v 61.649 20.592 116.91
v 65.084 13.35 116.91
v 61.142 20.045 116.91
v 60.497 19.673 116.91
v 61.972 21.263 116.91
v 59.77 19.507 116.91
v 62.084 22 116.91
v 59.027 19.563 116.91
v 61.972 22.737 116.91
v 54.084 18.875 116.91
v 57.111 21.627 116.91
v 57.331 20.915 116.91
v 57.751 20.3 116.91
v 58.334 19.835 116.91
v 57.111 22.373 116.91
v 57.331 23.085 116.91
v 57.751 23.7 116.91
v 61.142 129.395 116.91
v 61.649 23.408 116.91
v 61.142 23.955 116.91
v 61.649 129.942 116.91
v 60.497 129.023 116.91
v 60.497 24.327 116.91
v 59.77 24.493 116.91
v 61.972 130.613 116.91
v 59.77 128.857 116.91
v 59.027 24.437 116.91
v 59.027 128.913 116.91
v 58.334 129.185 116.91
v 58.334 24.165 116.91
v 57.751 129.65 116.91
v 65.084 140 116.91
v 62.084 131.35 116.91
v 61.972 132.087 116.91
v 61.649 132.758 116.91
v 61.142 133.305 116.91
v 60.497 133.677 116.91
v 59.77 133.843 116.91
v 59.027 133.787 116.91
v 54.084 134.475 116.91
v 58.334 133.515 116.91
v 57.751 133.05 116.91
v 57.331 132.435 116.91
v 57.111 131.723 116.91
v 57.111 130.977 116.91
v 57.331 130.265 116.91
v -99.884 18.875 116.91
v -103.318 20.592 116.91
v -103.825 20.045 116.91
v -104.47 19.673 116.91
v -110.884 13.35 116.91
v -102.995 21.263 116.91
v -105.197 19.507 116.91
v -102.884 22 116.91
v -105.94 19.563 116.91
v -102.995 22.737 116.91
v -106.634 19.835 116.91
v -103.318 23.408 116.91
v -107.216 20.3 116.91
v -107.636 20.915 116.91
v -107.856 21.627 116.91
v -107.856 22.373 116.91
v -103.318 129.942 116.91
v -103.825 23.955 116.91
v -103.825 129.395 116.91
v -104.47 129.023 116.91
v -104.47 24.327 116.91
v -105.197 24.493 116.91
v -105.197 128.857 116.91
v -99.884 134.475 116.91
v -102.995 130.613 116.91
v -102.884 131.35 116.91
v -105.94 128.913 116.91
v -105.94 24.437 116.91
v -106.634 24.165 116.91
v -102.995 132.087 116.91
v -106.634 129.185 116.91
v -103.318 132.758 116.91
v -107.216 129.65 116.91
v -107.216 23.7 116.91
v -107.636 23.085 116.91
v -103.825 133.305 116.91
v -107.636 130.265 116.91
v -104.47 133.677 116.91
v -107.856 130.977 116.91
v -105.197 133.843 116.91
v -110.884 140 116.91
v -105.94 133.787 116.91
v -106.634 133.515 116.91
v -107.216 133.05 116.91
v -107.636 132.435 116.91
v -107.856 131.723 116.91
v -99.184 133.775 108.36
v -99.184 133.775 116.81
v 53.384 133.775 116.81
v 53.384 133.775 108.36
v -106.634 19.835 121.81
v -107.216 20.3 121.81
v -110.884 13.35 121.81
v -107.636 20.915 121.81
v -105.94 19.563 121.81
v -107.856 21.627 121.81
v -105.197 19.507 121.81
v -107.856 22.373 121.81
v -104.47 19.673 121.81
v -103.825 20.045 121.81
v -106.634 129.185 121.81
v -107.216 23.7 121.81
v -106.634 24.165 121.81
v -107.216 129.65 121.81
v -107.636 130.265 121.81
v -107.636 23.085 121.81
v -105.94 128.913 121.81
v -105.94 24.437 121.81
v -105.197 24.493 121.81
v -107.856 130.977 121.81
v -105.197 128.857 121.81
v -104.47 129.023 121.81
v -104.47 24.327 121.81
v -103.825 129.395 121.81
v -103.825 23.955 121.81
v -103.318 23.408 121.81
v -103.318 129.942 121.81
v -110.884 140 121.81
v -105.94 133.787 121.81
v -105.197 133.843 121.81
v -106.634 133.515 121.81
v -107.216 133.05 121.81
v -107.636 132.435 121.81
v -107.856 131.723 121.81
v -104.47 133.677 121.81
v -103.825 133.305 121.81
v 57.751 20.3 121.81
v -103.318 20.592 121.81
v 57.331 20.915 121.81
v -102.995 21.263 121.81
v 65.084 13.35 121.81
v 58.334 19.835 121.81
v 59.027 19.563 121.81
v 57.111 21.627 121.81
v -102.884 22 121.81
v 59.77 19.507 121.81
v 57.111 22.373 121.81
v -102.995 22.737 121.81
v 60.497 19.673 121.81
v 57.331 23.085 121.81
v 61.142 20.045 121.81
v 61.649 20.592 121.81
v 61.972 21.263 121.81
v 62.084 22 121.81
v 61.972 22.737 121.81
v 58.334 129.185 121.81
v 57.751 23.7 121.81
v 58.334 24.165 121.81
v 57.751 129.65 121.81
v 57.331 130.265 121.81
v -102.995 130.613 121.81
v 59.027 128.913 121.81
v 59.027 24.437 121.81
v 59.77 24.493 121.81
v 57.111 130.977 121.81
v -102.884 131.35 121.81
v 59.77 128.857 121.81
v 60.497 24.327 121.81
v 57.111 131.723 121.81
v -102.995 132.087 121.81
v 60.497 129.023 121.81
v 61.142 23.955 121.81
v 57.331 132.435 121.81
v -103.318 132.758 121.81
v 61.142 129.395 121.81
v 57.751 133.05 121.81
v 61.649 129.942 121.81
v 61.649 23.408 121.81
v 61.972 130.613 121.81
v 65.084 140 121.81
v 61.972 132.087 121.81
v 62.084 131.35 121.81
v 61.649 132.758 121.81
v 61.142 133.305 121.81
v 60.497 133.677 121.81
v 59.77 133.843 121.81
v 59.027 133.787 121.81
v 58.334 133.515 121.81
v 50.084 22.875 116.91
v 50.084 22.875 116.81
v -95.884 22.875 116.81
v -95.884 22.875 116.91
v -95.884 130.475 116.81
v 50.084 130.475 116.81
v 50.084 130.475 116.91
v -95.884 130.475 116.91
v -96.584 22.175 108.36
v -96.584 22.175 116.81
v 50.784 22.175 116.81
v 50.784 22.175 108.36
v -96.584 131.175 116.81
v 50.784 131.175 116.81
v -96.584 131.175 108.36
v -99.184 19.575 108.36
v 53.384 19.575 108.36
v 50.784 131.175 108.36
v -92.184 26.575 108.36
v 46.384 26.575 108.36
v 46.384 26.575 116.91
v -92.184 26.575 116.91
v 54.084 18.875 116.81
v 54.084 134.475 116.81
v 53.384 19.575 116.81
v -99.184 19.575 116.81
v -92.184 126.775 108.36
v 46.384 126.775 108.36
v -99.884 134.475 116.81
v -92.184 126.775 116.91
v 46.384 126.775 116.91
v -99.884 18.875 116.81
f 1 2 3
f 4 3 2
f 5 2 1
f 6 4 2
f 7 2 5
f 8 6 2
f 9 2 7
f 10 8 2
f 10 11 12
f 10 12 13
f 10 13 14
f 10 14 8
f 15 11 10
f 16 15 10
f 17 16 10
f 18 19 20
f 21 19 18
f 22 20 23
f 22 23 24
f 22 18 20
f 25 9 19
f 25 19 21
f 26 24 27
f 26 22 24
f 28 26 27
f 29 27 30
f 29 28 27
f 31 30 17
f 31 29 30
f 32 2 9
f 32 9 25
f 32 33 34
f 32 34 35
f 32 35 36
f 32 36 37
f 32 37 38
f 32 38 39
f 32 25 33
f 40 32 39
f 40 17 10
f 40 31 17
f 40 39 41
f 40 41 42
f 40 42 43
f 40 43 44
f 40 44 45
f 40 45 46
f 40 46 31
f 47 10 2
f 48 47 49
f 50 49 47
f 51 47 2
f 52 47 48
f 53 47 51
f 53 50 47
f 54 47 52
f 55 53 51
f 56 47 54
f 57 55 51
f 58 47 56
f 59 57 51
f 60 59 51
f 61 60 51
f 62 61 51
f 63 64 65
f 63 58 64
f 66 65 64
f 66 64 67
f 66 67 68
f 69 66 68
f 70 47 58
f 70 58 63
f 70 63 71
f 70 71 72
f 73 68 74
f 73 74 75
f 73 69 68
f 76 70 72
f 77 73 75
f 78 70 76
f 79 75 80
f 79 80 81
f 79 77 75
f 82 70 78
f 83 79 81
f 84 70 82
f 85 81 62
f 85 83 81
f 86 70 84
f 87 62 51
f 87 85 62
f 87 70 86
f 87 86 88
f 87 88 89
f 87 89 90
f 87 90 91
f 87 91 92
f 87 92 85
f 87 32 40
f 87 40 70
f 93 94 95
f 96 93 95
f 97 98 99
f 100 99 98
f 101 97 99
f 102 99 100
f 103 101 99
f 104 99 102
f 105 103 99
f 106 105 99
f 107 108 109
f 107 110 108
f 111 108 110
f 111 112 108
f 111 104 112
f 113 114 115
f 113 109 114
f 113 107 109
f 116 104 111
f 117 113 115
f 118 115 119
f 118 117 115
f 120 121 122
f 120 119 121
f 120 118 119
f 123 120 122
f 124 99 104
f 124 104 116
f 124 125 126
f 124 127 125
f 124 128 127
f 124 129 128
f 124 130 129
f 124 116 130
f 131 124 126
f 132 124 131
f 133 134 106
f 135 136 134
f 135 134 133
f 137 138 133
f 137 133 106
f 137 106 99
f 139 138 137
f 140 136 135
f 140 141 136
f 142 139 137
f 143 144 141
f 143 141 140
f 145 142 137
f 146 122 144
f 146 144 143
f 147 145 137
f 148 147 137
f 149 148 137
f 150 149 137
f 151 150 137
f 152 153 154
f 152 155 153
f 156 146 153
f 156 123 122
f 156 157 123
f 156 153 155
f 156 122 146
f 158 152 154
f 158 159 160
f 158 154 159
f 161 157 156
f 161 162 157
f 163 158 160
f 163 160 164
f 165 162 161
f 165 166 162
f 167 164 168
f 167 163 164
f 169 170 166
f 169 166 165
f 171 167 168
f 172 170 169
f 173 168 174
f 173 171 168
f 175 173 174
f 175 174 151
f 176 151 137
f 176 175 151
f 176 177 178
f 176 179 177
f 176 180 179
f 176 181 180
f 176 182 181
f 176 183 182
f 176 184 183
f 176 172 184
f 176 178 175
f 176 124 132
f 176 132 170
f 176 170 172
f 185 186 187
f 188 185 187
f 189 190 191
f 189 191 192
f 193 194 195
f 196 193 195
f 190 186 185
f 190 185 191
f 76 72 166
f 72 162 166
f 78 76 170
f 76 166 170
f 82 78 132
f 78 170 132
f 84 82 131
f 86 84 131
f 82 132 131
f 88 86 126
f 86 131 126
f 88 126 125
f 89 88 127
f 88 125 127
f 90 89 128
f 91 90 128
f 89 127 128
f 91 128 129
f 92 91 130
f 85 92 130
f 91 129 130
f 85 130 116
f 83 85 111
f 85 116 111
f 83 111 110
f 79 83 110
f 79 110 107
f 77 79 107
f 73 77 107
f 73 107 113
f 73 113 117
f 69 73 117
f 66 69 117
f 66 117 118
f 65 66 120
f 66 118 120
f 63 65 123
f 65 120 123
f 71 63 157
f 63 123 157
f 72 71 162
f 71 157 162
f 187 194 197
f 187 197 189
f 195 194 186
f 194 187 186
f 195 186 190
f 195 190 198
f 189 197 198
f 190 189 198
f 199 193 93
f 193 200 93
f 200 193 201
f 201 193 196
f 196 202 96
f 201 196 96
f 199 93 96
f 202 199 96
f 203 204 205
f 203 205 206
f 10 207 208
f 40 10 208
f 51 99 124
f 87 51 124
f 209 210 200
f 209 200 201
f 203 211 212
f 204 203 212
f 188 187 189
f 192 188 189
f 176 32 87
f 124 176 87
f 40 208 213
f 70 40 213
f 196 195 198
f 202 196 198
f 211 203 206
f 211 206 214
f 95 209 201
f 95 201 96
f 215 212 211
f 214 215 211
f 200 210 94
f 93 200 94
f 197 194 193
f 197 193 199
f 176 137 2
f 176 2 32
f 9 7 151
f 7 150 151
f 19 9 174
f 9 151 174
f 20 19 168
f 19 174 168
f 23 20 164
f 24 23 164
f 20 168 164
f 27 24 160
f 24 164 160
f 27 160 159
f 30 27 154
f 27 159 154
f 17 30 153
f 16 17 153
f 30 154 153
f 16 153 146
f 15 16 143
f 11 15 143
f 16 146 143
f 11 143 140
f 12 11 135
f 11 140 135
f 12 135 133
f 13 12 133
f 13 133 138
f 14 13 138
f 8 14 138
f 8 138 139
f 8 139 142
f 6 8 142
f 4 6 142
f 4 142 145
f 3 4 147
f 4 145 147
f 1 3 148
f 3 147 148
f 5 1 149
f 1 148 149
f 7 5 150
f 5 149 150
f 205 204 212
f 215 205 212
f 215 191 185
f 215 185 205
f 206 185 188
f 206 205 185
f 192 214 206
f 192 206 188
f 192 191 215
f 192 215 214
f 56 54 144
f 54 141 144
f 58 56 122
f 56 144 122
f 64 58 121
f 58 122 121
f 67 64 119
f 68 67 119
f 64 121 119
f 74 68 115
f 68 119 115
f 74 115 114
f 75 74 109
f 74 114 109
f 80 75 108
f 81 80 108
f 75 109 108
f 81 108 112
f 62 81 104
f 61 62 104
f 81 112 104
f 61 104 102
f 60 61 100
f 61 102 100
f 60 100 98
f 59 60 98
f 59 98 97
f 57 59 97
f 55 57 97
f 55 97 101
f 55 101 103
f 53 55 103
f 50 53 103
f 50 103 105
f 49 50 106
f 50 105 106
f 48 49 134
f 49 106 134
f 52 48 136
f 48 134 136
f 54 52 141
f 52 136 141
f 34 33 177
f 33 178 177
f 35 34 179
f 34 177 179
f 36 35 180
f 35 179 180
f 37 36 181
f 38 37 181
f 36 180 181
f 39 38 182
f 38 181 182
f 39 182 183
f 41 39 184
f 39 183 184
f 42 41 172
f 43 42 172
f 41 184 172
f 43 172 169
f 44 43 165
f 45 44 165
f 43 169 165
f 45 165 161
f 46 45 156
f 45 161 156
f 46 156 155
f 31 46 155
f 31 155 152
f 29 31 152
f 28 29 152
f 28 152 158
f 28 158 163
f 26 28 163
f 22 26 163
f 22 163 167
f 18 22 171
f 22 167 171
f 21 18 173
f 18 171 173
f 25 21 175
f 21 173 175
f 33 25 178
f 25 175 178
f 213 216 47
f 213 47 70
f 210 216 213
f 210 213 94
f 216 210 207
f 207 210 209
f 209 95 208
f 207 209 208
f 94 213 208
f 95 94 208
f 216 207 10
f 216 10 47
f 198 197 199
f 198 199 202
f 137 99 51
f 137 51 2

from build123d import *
from OCP.BRepFilletAPI import BRepFilletAPI_MakeChamfer

# Parameters (mm, degrees)
SKETCH1_R               = 172.5
BOSS_EXTRUDE1_DEPTH     = 10
SKETCH2_R               = 48.41
CUT_EXTRUDE1_DEPTH      = 10
BOSS_EXTRUDE2_DEPTH     = 5
CUT_EXTRUDE2_DEPTH      = 497
CUT_EXTRUDE6_START      = -497
CUT_EXTRUDE6_DEPTH      = 497
SKETCH6_W               = 195.767044214
SKETCH6_H               = 55
SKETCH6_W_2             = 185.767044214
SKETCH6_H_2             = 45
BOSS_EXTRUDE3_DEPTH     = 133.35
SKETCH7_W               = 185.767044214
SKETCH7_H               = 45
BOSS_EXTRUDE4_DEPTH     = 5
BOSS_EXTRUDE5_DEPTH     = 8
CHAMFER1_SIZE           = 8
CHAMFER1_SIZE2          = 6.250285012
CHAMFER1_PART_2_SIZE    = 8
CHAMFER1_PART_2_SIZE2   = 6.250285012
CHAMFER1_PART_3_SIZE    = 8
CHAMFER1_PART_3_SIZE2   = 6.250285012
FILLET1_R               = 38
SKETCH9_R               = 374.079334695
CUT_EXTRUDE7_DEPTH      = 93
CUT_EXTRUDE8_DEPTH      = 93
CUT_EXTRUDE8_DEPTH_BACK = 93
SKETCH10_R              = 229.38613092
SKETCH10_R_2            = 152.4
SKETCH11_W              = 291.443368419
SKETCH11_H              = 134.798764099
SKETCH11_W_2            = 144.967044214
SKETCH11_H_2            = 55
CUT_EXTRUDE9_DEPTH      = 143
SKETCH12_W              = 5
SKETCH12_H              = 55
BOSS_EXTRUDE6_DEPTH     = 133.35
SKETCH13_R              = 10
CUT_EXTRUDE10_DEPTH     = 58
SKETCH14_W              = 139.967044214
SKETCH14_H              = 45
BOSS_EXTRUDE7_DEPTH     = 5
SKETCH15_W              = 139.967044214
SKETCH15_H              = 123.35
CUT_EXTRUDE11_DEPTH     = 13
SKETCH16_W              = 10
SKETCH16_H              = 133.35
SKETCH16_W_2            = 149.967044214
BOSS_EXTRUDE9_DEPTH     = 17
SKETCH17_W              = 153.967044214
SKETCH17_H              = 115.6
SKETCH17_W_2            = 145.967044214
SKETCH17_H_2            = 107.6
CUT_EXTRUDE12_DEPTH     = 10
CHAMFER2_SIZE           = 10
CHAMFER2_SIZE2          = 5.773502692
SKETCH24_R              = 15
CUT_EXTRUDE16_DEPTH     = 177.5
SKETCH20_W              = 169.967044214
SKETCH20_H              = 3.35
CUT_EXTRUDE17_DEPTH     = 177.5
SKETCH25_W              = 139.967044214
SKETCH25_H              = 38.773502692
BOSS_EXTRUDE11_DEPTH    = 5
SKETCH26_W              = 3
SKETCH26_H              = 130
BOSS_EXTRUDE12_DEPTH    = 17
SKETCH18_R              = 2.5
CUT_EXTRUDE19_DEPTH     = 26
SKETCH27_W              = 152.567044214
SKETCH27_H              = 114.2
SKETCH27_W_2            = 147.367044214
SKETCH27_H_2            = 109
BOSS_EXTRUDE13_DEPTH    = 8.45
SKETCH27_W_3            = 138.567044214
SKETCH27_H_3            = 100.2
BOSS_EXTRUDE13_2_DEPTH  = 8.45
BOSS_EXTRUDE14_START    = 5
SKETCH28_W              = 175.967044214
SKETCH28_H              = 130
SKETCH28_R              = 2.5
BOSS_EXTRUDE14_DEPTH    = 5
SKETCH29_W              = 292.528596907
SKETCH29_H              = 171.315367969
CUT_EXTRUDE20_DEPTH     = 46.55
SKETCH30_W              = 175.967044214
SKETCH30_H              = 130
SKETCH30_W_2            = 153.967044214
SKETCH30_H_2            = 115.6
SKETCH30_W_3            = 145.967044214
SKETCH30_H_3            = 107.6
SKETCH30_W_4            = 138.567044214
SKETCH30_H_4            = 100.2
CUT_EXTRUDE23_DEPTH     = 8.55
SKETCH31_W              = 175.967044214
SKETCH31_H              = 17.196232217
CUT_EXTRUDE24_DEPTH     = 10


with BuildPart() as part:
    # Sketch1 → Boss-Extrude1 (new body)
    with BuildSketch(Plane(origin=(0, 0, 0), x_dir=(1, 0, 0), z_dir=(0, 1, 0))):
        with Locations(Location((0, 0, 0), (0, 0, 270))):
            Circle(SKETCH1_R)
    extrude(amount=BOSS_EXTRUDE1_DEPTH)

    # Sketch2 → Cut-Extrude1 (cut)
    with BuildSketch(Plane(origin=(0, 10, 0), x_dir=(1, 0, 0), z_dir=(0, 1, 0))):
        with Locations((-75.91, -178.72)):
            Circle(SKETCH2_R)
        with Locations((75.91, -178.72)):
            Circle(SKETCH2_R)
    extrude(amount=-CUT_EXTRUDE1_DEPTH, mode=Mode.SUBTRACT)

    # Sketch3 → Boss-Extrude2 (add)
    with BuildSketch(Plane(origin=(0, 10, 0), x_dir=(1, 0, 0), z_dir=(0, 1, 0))):
        with BuildLine():
            Line((-98.968297449, -119.81), (98.968297449, -119.81))
            ThreePointArc((98.968297449, -119.81), (0, 155.4), (-98.968297449, -119.81))
        make_face()
        with BuildLine():
            ThreePointArc((97.883522107, -116.81), (0, 152.4), (-97.883522107, -116.81))
            Line((-97.883522107, -116.81), (97.883522107, -116.81))
        make_face(mode=Mode.SUBTRACT)
    extrude(amount=BOSS_EXTRUDE2_DEPTH)

    # Sketch4 → Cut-Extrude2 (cut)
    with BuildSketch(Plane(origin=(0, 10, 0), x_dir=(1, 0, 0), z_dir=(0, 1, 0))):
        Polygon((-28.261160255, -170.169200565), (28.261160255, -170.169200565), (28.261160255, -183.836149753), (-30.300470404, -183.836149753), align=None)
    extrude(amount=-CUT_EXTRUDE2_DEPTH, mode=Mode.SUBTRACT)

    # Sketch5 → Cut-Extrude6 (cut)
    with BuildSketch(Plane(origin=(0, 10, 0), x_dir=(1, 0, 0), z_dir=(0, 1, 0)).offset(CUT_EXTRUDE6_START)):
        with BuildLine():
            ThreePointArc((26.702080818, 170.420799435), (0, 172.5), (-26.702080818, 170.420799435))
            Line((-26.702080818, 170.420799435), (26.702080818, 170.420799435))
        make_face()
        with BuildLine():
            ThreePointArc((166.525, -45.007492432), (172.5, 0), (166.525, 45.007492432))
            Line((166.525, 45.007492432), (166.525, -45.007492432))
        make_face()
        with BuildLine():
            Line((-166.525, -45.007492432), (-166.525, 45.007492432))
            ThreePointArc((-166.525, 45.007492432), (-172.5, 0), (-166.525, -45.007492432))
        make_face()
    extrude(amount=CUT_EXTRUDE6_DEPTH, mode=Mode.SUBTRACT)

    # Sketch6 → Boss-Extrude3 (add)
    with BuildSketch(Plane(origin=(0, 10, 0), x_dir=(1, 0, 0), z_dir=(0, 1, 0))):
        with Locations((0, -89.31)):
            Rectangle(SKETCH6_W, SKETCH6_H)
        with Locations((0, -89.31)):
            Rectangle(SKETCH6_W_2, SKETCH6_H_2, mode=Mode.SUBTRACT)
    extrude(amount=BOSS_EXTRUDE3_DEPTH)

    # Sketch7 → Boss-Extrude4 (add)
    with BuildSketch(Plane(origin=(0, 10, 0), x_dir=(1, 0, 0), z_dir=(0, 1, 0))):
        with Locations((0, -89.31)):
            Rectangle(SKETCH7_W, SKETCH7_H)
    extrude(amount=BOSS_EXTRUDE4_DEPTH)

    # Sketch8 → Boss-Extrude5 (add)
    with BuildSketch(Plane(origin=(0, 10, 0), x_dir=(1, 0, 0), z_dir=(0, 1, 0))):
        with BuildLine():
            Line((-97.883522107, -61.81), (-112.883522107, -61.81))
            Line((-112.883522107, -61.81), (-112.883522107, -101.267136509))
            ThreePointArc((-112.883522107, -101.267136509), (-105.634768892, -108.807252061), (-97.883522107, -115.829782871))
            Line((-97.883522107, -115.829782871), (-97.883522107, -61.81))
        make_face()
        with BuildLine():
            Line((-88.028513968, -46.81), (-88.028513968, -61.81))
            Line((-88.028513968, -61.81), (97.883522107, -61.81))
            Line((97.883522107, -61.81), (97.883522107, -115.829782871))
            ThreePointArc((97.883522107, -115.829782871), (105.634768892, -108.807252061), (112.883522107, -101.267136509))
            Line((112.883522107, -101.267136509), (112.883522107, -46.81))
            Line((112.883522107, -46.81), (-88.028513968, -46.81))
        make_face()
    extrude(amount=BOSS_EXTRUDE5_DEPTH)

    # Chamfer1
    chamfer1_edges = [part.edges().sort_by_distance(p)[0] for p in [
        (-97.883522107, 18, 88.819891436),
    ]]
    chamfer1_side = [part.faces().sort_by_distance(p)[0] for p in [
        (-97.883522107, 80.599247918, 89.340686997),
    ]]
    chamfer(chamfer1_edges, length=CHAMFER1_SIZE, length2=CHAMFER1_SIZE2, reference=chamfer1_side[0])

    # Chamfer1 part 2
    chamfer1_part_2_edges = [part.edges().sort_by_distance(p)[0] for p in [
        (4.927504069, 18, 61.81),
    ]]
    chamfer1_part_2_side = [part.faces().sort_by_distance(p)[0] for p in [
        (-0.807441513, 80.139082253, 61.81),
    ]]
    chamfer(chamfer1_part_2_edges, length=CHAMFER1_PART_2_SIZE, length2=CHAMFER1_PART_2_SIZE2, reference=chamfer1_part_2_side[0])

    # Chamfer1 part 3
    chamfer1_part_3_edges = [part.edges().sort_by_distance(p)[0] for p in [
        (97.883522107, 18, 88.819891436),
    ]]
    chamfer1_part_3_side = [part.faces().sort_by_distance(p)[0] for p in [
        (97.883522107, 80.599247918, 89.340686997),
    ]]
    chamfer(chamfer1_part_3_edges, length=CHAMFER1_PART_3_SIZE, length2=CHAMFER1_PART_3_SIZE2, reference=chamfer1_part_3_side[0])

    # Fillet1
    # the kernel refuses this fillet: 38 mm, written as the material it adds along each edge
    with BuildSketch(Plane(origin=(-97.883522107, 26, 148.028657271), x_dir=(-0.61566147532566, -0.7880107536067207, 0), z_dir=(0, 0, -1))) as fillet1_piece_1_section:
        with BuildLine():
            CenterArc((13.24591235, 37.873851244), FILLET1_R, 232, 33.330100487)
            Line((-10.149223713, 7.929442607), (0, 0))
            Line((0, 0), (10.152145721, 0))
        make_face()
    fillet1_piece_1 = extrude(amount=86.218657271, mode=Mode.PRIVATE)
    fillet1_piece_1 = fillet1_piece_1 & Plane(origin=(0, 26, 0), x_dir=(-0.7443687577094257, 0, 0.6677687867414337), z_dir=(0, -1, 0)) * Cylinder(151.65, 214, mode=Mode.PRIVATE)
    add(fillet1_piece_1)
    with BuildSketch(Plane(origin=(-88.028513968, 26, 61.81), x_dir=(0, 1, 0), z_dir=(1, 0, 0))) as fillet1_piece_2_section:
        with BuildLine():
            CenterArc((12.87954976, -38), FILLET1_R, 90, 33.330100487)
            Line((-8, -6.250285012), (0, 0))
            Line((0, 0), (12.87954976, 0))
        make_face()
    fillet1_piece_2 = extrude(amount=218.110910475, mode=Mode.PRIVATE)
    fillet1_piece_2 = fillet1_piece_2 - Plane(origin=(135.883522107, 38.87954976, 61.81), x_dir=(-0.8355188154722692, -0.5494618357919104, 0), z_dir=(0, 0, -1)) * Cylinder(38, 488, mode=Mode.PRIVATE)
    add(fillet1_piece_2)
    with BuildSketch(Plane(origin=(97.883522107, 26, 29.6111256), x_dir=(0.61566147532566, -0.7880107536067207, 0), z_dir=(0, 0, 1))) as fillet1_piece_3_section:
        with BuildLine():
            CenterArc((13.24591235, 37.873851244), FILLET1_R, 232, 33.330100487)
            Line((-10.149223713, 7.929442607), (0, 0))
            Line((0, 0), (10.152145721, 0))
        make_face()
    fillet1_piece_3 = extrude(amount=118.417531672, mode=Mode.PRIVATE)
    fillet1_piece_3 = fillet1_piece_3 & Plane(origin=(0, 26, 0), x_dir=(0.6454567893612635, 0, 0.7637967878090673), z_dir=(0, -1, 0)) * Cylinder(151.65, 278, mode=Mode.PRIVATE)
    fillet1_piece_3 = fillet1_piece_3 - Plane(origin=(97.883522107, 38.87954976, 23.81), x_dir=(0, 0, 1), z_dir=(-1, 0, 0)) * Cylinder(38, 278, mode=Mode.PRIVATE)
    add(fillet1_piece_3)

    # Sketch9 → Cut-Extrude7 (cut)
    with BuildSketch(Plane(origin=(0, 10, 0), x_dir=(1, 0, 0), z_dir=(0, 1, 0))):
        Circle(SKETCH9_R)
    extrude(amount=-CUT_EXTRUDE7_DEPTH, mode=Mode.SUBTRACT)

    # Sketch10 → Cut-Extrude8 (cut, two sides: drawn at the far end of the back side and taken through both)
    with BuildSketch(Plane.XZ.offset(-10).offset(-CUT_EXTRUDE8_DEPTH_BACK)):
        Circle(SKETCH10_R)
        Circle(SKETCH10_R_2, mode=Mode.SUBTRACT)
    extrude(amount=CUT_EXTRUDE8_DEPTH + CUT_EXTRUDE8_DEPTH_BACK, mode=Mode.SUBTRACT)

    # Sketch11 → Cut-Extrude9 (cut)
    with BuildSketch(Plane(origin=(0, 143.35, 0), x_dir=(1, 0, 0), z_dir=(0, 1, 0))):
        with Locations((4.840839595, -88.771460056)):
            Rectangle(SKETCH11_W, SKETCH11_H)
        with Locations((-25.4, -89.31)):
            Rectangle(SKETCH11_W_2, SKETCH11_H_2, mode=Mode.SUBTRACT)
    extrude(amount=-CUT_EXTRUDE9_DEPTH, mode=Mode.SUBTRACT)

    # Sketch12 → Boss-Extrude6 (add)
    with BuildSketch(Plane(origin=(0, 143.35, 0), x_dir=(1, 0, 0), z_dir=(0, 1, 0))):
        with Locations((49.583522107, -89.31)):
            Rectangle(SKETCH12_W, SKETCH12_H)
    extrude(amount=-BOSS_EXTRUDE6_DEPTH)

    # Sketch13 → Cut-Extrude10 (cut)
    with BuildSketch(Plane.ZY.offset(97.883522107)):
        with Locations((89.418847681, 75)):
            Circle(SKETCH13_R)
    extrude(amount=-CUT_EXTRUDE10_DEPTH, mode=Mode.SUBTRACT)

    # Sketch14 → Boss-Extrude7 (add)
    with BuildSketch(Plane(origin=(0, 143.35, 0), x_dir=(1, 0, 0), z_dir=(0, 1, 0))):
        with Locations((-22.9, -89.31)):
            Rectangle(SKETCH14_W, SKETCH14_H)
    extrude(amount=-BOSS_EXTRUDE7_DEPTH)

    # Sketch15 → Cut-Extrude11 (cut)
    with BuildSketch(Plane.XY.offset(116.81)):
        with Locations((-22.9, 76.675)):
            Rectangle(SKETCH15_W, SKETCH15_H)
    extrude(amount=-CUT_EXTRUDE11_DEPTH, mode=Mode.SUBTRACT)

    # Sketch16 → Boss-Extrude9 (add)
    # profile 1 of 5: a face of its own
    with BuildSketch(Plane.XY.offset(116.81)):
        with Locations((-102.883522107, 76.675)):
            Rectangle(SKETCH16_W, SKETCH16_H)
    # profile 2 of 5: a face of its own
    with BuildSketch(Plane.XY.offset(116.81)):
        with Locations((-22.9, 76.675)):
            Rectangle(SKETCH16_W_2, SKETCH16_H)
        Polygon((-92.883522107, 127.475), (-92.883522107, 138.35), (47.083522107, 138.35), (47.083522107, 127.475), (47.083522107, 76.675), (47.083522107, 25.875), (47.083522107, 15), (-92.883522107, 15), (-92.883522107, 25.875), (-92.883522107, 76.675), align=None, mode=Mode.SUBTRACT)
    # profile 3 of 5: a face of its own
    with BuildSketch(Plane.XY.offset(116.81)):
        with Locations((57.083522107, 76.675)):
            Rectangle(SKETCH16_W, SKETCH16_H)
    # profile 4 of 5: a face of its own
    with BuildSketch(Plane.XY.offset(116.81)):
        Polygon((47.083522107, 138.35), (-92.883522107, 138.35), (-92.883522107, 127.475), (-22.9, 127.475), (47.083522107, 127.475), align=None)
    # profile 5 of 5: a face of its own
    with BuildSketch(Plane.XY.offset(116.81)):
        Polygon((-22.9, 25.875), (-92.883522107, 25.875), (-92.883522107, 15), (47.083522107, 15), (47.083522107, 25.875), align=None)
    extrude(amount=-BOSS_EXTRUDE9_DEPTH)

    # Sketch17 → Cut-Extrude12 (cut)
    with BuildSketch(Plane.XY.offset(116.81)):
        with Locations((-22.9, 76.675)):
            Rectangle(SKETCH17_W, SKETCH17_H)
        with Locations((-22.9, 76.675)):
            Rectangle(SKETCH17_W_2, SKETCH17_H_2, mode=Mode.SUBTRACT)
    extrude(amount=-CUT_EXTRUDE12_DEPTH, mode=Mode.SUBTRACT)

    # Chamfer2: one chamfer whose edges measure the first distance from different faces: ONE call of the kernel's chamfer builder (chamfer() names one face for all edges)
    chamfer2_edges_1 = [part.edges().sort_by_distance(p)[0] for p in [
        (-22.9, 25.875, 99.81),
    ]]
    chamfer2_side_1 = [part.faces().sort_by_distance(p)[0] for p in [
        (-22.9, 25.875, 108.31),
    ]]
    chamfer2_edges_2 = [part.edges().sort_by_distance(p)[0] for p in [
        (-22.9, 127.475, 99.81),
    ]]
    chamfer2_side_2 = [part.faces().sort_by_distance(p)[0] for p in [
        (-22.9, 132.9125, 99.81),
    ]]
    chamfer2 = BRepFilletAPI_MakeChamfer(part.part.solid().wrapped)
    for e in chamfer2_edges_1:
        chamfer2.Add(CHAMFER2_SIZE, CHAMFER2_SIZE2, e.wrapped, chamfer2_side_1[0].wrapped)  # the first distance lies on this face
    for e in chamfer2_edges_2:
        chamfer2.Add(CHAMFER2_SIZE, CHAMFER2_SIZE2, e.wrapped, chamfer2_side_2[0].wrapped)  # the first distance lies on this face
    add(Compound.cast(chamfer2.Shape()), mode=Mode.REPLACE)

    # Sketch24 → Cut-Extrude16 (cut)
    with BuildSketch(Plane.ZY.offset(97.883522107)):
        with Locations((83.81, 75)):
            Circle(SKETCH24_R)
    extrude(amount=-CUT_EXTRUDE16_DEPTH, mode=Mode.SUBTRACT)

    # Sketch20 → Cut-Extrude17 (cut)
    with BuildSketch(Plane.XY.offset(116.81)):
        with Locations((-22.9, 11.675)):
            Rectangle(SKETCH20_W, SKETCH20_H)
    extrude(amount=-CUT_EXTRUDE17_DEPTH, mode=Mode.SUBTRACT)

    # Sketch25 → Boss-Extrude11 (add)
    with BuildSketch(Plane(origin=(0, 13.35, 0), x_dir=(-1, 0, 0), z_dir=(0, -1, 0))):
        with Locations((22.9, -86.196751346)):
            Rectangle(SKETCH25_W, SKETCH25_H)
    extrude(amount=-BOSS_EXTRUDE11_DEPTH)

    # Sketch26 → Boss-Extrude12 (add)
    with BuildSketch(Plane.XY.offset(116.81)):
        with Locations((-109.383522107, 78.35)):
            Rectangle(SKETCH26_W, SKETCH26_H)
        with Locations((63.583522107, 78.35)):
            Rectangle(SKETCH26_W, SKETCH26_H)
    extrude(amount=-BOSS_EXTRUDE12_DEPTH)

    # Sketch18 → Cut-Extrude19 (cut)
    with BuildSketch(Plane.XY.offset(116.81)):
        with Locations((-105.383522107, 22)):
            Circle(SKETCH18_R)
        with Locations((59.583522107, 22)):
            Circle(SKETCH18_R)
        with Locations((59.583522107, 131.35)):
            Circle(SKETCH18_R)
        with Locations((-105.383522107, 131.35)):
            Circle(SKETCH18_R)
    extrude(amount=-CUT_EXTRUDE19_DEPTH, mode=Mode.SUBTRACT)



with BuildPart() as body_2:
    # Sketch27 → Boss-Extrude13 (new body)
    with BuildSketch(Plane.XY.offset(116.81)):
        with Locations((-22.9, 76.675)):
            Rectangle(SKETCH27_W, SKETCH27_H)
        with Locations((-22.9, 76.675)):
            Rectangle(SKETCH27_W_2, SKETCH27_H_2, mode=Mode.SUBTRACT)
    extrude(amount=-BOSS_EXTRUDE13_DEPTH)


with BuildPart() as body_3:
    # Sketch27 → Boss-Extrude13 2 (new body)
    with BuildSketch(Plane.XY.offset(116.81)):
        with Locations((-22.9, 76.675)):
            Rectangle(SKETCH27_W_3, SKETCH27_H_3)
    extrude(amount=-BOSS_EXTRUDE13_2_DEPTH)


with BuildPart() as part_1:
    add(part.part)

    add(body_2.part)  # Boss-Extrude14 merges body 2

    add(body_3.part)  # Boss-Extrude14 merges body 3
    # Sketch28 → Boss-Extrude14 (add)
    with BuildSketch(Plane.XY.offset(116.81).offset(BOSS_EXTRUDE14_START)):
        with Locations((-22.9, 78.35)):
            Rectangle(SKETCH28_W, SKETCH28_H)
        with Locations((-105.383522107, 131.35)):
            Circle(SKETCH28_R, mode=Mode.SUBTRACT)
        with Locations((59.583522107, 131.35)):
            Circle(SKETCH28_R, mode=Mode.SUBTRACT)
        with Locations((59.583522107, 22)):
            Circle(SKETCH28_R, mode=Mode.SUBTRACT)
        with Locations((-105.383522107, 22)):
            Circle(SKETCH28_R, mode=Mode.SUBTRACT)
    extrude(amount=-BOSS_EXTRUDE14_DEPTH)

    # Sketch29 → Cut-Extrude20 (cut)
    with BuildSketch(Plane(origin=(0, 0, 61.81), x_dir=(-1, 0, 0), z_dir=(0, 0, -1))):
        with Locations((7.671703237, 74.887303123)):
            Rectangle(SKETCH29_W, SKETCH29_H)
    extrude(amount=-CUT_EXTRUDE20_DEPTH, mode=Mode.SUBTRACT)

    # Sketch30 → Cut-Extrude23 (cut)
    # profile 1 of 2: a face of its own
    with BuildSketch(Plane(origin=(0, 0, 108.36), x_dir=(-1, 0, 0), z_dir=(0, 0, -1))):
        with Locations((22.9, 78.35)):
            Rectangle(SKETCH30_W, SKETCH30_H)
        with Locations((22.9, 76.675)):
            Rectangle(SKETCH30_W_2, SKETCH30_H_2, mode=Mode.SUBTRACT)
    # profile 2 of 2: a face of its own
    with BuildSketch(Plane(origin=(0, 0, 108.36), x_dir=(-1, 0, 0), z_dir=(0, 0, -1))):
        with Locations((22.9, 76.675)):
            Rectangle(SKETCH30_W_3, SKETCH30_H_3)
        with Locations((22.9, 76.675)):
            Rectangle(SKETCH30_W_4, SKETCH30_H_4, mode=Mode.SUBTRACT)
    extrude(amount=-CUT_EXTRUDE23_DEPTH, mode=Mode.SUBTRACT)

    # Sketch31 → Cut-Extrude24 (cut)
    with BuildSketch(Plane(origin=(0, 0, 116.91), x_dir=(-1, 0, 0), z_dir=(0, 0, -1))):
        with Locations((22.9, 4.751883892)):
            Rectangle(SKETCH31_W, SKETCH31_H)
        with Locations((22.9, 148.598116108)):
            Rectangle(SKETCH31_W, SKETCH31_H)
    extrude(amount=-CUT_EXTRUDE24_DEPTH, mode=Mode.SUBTRACT)


solid = part_1.part
